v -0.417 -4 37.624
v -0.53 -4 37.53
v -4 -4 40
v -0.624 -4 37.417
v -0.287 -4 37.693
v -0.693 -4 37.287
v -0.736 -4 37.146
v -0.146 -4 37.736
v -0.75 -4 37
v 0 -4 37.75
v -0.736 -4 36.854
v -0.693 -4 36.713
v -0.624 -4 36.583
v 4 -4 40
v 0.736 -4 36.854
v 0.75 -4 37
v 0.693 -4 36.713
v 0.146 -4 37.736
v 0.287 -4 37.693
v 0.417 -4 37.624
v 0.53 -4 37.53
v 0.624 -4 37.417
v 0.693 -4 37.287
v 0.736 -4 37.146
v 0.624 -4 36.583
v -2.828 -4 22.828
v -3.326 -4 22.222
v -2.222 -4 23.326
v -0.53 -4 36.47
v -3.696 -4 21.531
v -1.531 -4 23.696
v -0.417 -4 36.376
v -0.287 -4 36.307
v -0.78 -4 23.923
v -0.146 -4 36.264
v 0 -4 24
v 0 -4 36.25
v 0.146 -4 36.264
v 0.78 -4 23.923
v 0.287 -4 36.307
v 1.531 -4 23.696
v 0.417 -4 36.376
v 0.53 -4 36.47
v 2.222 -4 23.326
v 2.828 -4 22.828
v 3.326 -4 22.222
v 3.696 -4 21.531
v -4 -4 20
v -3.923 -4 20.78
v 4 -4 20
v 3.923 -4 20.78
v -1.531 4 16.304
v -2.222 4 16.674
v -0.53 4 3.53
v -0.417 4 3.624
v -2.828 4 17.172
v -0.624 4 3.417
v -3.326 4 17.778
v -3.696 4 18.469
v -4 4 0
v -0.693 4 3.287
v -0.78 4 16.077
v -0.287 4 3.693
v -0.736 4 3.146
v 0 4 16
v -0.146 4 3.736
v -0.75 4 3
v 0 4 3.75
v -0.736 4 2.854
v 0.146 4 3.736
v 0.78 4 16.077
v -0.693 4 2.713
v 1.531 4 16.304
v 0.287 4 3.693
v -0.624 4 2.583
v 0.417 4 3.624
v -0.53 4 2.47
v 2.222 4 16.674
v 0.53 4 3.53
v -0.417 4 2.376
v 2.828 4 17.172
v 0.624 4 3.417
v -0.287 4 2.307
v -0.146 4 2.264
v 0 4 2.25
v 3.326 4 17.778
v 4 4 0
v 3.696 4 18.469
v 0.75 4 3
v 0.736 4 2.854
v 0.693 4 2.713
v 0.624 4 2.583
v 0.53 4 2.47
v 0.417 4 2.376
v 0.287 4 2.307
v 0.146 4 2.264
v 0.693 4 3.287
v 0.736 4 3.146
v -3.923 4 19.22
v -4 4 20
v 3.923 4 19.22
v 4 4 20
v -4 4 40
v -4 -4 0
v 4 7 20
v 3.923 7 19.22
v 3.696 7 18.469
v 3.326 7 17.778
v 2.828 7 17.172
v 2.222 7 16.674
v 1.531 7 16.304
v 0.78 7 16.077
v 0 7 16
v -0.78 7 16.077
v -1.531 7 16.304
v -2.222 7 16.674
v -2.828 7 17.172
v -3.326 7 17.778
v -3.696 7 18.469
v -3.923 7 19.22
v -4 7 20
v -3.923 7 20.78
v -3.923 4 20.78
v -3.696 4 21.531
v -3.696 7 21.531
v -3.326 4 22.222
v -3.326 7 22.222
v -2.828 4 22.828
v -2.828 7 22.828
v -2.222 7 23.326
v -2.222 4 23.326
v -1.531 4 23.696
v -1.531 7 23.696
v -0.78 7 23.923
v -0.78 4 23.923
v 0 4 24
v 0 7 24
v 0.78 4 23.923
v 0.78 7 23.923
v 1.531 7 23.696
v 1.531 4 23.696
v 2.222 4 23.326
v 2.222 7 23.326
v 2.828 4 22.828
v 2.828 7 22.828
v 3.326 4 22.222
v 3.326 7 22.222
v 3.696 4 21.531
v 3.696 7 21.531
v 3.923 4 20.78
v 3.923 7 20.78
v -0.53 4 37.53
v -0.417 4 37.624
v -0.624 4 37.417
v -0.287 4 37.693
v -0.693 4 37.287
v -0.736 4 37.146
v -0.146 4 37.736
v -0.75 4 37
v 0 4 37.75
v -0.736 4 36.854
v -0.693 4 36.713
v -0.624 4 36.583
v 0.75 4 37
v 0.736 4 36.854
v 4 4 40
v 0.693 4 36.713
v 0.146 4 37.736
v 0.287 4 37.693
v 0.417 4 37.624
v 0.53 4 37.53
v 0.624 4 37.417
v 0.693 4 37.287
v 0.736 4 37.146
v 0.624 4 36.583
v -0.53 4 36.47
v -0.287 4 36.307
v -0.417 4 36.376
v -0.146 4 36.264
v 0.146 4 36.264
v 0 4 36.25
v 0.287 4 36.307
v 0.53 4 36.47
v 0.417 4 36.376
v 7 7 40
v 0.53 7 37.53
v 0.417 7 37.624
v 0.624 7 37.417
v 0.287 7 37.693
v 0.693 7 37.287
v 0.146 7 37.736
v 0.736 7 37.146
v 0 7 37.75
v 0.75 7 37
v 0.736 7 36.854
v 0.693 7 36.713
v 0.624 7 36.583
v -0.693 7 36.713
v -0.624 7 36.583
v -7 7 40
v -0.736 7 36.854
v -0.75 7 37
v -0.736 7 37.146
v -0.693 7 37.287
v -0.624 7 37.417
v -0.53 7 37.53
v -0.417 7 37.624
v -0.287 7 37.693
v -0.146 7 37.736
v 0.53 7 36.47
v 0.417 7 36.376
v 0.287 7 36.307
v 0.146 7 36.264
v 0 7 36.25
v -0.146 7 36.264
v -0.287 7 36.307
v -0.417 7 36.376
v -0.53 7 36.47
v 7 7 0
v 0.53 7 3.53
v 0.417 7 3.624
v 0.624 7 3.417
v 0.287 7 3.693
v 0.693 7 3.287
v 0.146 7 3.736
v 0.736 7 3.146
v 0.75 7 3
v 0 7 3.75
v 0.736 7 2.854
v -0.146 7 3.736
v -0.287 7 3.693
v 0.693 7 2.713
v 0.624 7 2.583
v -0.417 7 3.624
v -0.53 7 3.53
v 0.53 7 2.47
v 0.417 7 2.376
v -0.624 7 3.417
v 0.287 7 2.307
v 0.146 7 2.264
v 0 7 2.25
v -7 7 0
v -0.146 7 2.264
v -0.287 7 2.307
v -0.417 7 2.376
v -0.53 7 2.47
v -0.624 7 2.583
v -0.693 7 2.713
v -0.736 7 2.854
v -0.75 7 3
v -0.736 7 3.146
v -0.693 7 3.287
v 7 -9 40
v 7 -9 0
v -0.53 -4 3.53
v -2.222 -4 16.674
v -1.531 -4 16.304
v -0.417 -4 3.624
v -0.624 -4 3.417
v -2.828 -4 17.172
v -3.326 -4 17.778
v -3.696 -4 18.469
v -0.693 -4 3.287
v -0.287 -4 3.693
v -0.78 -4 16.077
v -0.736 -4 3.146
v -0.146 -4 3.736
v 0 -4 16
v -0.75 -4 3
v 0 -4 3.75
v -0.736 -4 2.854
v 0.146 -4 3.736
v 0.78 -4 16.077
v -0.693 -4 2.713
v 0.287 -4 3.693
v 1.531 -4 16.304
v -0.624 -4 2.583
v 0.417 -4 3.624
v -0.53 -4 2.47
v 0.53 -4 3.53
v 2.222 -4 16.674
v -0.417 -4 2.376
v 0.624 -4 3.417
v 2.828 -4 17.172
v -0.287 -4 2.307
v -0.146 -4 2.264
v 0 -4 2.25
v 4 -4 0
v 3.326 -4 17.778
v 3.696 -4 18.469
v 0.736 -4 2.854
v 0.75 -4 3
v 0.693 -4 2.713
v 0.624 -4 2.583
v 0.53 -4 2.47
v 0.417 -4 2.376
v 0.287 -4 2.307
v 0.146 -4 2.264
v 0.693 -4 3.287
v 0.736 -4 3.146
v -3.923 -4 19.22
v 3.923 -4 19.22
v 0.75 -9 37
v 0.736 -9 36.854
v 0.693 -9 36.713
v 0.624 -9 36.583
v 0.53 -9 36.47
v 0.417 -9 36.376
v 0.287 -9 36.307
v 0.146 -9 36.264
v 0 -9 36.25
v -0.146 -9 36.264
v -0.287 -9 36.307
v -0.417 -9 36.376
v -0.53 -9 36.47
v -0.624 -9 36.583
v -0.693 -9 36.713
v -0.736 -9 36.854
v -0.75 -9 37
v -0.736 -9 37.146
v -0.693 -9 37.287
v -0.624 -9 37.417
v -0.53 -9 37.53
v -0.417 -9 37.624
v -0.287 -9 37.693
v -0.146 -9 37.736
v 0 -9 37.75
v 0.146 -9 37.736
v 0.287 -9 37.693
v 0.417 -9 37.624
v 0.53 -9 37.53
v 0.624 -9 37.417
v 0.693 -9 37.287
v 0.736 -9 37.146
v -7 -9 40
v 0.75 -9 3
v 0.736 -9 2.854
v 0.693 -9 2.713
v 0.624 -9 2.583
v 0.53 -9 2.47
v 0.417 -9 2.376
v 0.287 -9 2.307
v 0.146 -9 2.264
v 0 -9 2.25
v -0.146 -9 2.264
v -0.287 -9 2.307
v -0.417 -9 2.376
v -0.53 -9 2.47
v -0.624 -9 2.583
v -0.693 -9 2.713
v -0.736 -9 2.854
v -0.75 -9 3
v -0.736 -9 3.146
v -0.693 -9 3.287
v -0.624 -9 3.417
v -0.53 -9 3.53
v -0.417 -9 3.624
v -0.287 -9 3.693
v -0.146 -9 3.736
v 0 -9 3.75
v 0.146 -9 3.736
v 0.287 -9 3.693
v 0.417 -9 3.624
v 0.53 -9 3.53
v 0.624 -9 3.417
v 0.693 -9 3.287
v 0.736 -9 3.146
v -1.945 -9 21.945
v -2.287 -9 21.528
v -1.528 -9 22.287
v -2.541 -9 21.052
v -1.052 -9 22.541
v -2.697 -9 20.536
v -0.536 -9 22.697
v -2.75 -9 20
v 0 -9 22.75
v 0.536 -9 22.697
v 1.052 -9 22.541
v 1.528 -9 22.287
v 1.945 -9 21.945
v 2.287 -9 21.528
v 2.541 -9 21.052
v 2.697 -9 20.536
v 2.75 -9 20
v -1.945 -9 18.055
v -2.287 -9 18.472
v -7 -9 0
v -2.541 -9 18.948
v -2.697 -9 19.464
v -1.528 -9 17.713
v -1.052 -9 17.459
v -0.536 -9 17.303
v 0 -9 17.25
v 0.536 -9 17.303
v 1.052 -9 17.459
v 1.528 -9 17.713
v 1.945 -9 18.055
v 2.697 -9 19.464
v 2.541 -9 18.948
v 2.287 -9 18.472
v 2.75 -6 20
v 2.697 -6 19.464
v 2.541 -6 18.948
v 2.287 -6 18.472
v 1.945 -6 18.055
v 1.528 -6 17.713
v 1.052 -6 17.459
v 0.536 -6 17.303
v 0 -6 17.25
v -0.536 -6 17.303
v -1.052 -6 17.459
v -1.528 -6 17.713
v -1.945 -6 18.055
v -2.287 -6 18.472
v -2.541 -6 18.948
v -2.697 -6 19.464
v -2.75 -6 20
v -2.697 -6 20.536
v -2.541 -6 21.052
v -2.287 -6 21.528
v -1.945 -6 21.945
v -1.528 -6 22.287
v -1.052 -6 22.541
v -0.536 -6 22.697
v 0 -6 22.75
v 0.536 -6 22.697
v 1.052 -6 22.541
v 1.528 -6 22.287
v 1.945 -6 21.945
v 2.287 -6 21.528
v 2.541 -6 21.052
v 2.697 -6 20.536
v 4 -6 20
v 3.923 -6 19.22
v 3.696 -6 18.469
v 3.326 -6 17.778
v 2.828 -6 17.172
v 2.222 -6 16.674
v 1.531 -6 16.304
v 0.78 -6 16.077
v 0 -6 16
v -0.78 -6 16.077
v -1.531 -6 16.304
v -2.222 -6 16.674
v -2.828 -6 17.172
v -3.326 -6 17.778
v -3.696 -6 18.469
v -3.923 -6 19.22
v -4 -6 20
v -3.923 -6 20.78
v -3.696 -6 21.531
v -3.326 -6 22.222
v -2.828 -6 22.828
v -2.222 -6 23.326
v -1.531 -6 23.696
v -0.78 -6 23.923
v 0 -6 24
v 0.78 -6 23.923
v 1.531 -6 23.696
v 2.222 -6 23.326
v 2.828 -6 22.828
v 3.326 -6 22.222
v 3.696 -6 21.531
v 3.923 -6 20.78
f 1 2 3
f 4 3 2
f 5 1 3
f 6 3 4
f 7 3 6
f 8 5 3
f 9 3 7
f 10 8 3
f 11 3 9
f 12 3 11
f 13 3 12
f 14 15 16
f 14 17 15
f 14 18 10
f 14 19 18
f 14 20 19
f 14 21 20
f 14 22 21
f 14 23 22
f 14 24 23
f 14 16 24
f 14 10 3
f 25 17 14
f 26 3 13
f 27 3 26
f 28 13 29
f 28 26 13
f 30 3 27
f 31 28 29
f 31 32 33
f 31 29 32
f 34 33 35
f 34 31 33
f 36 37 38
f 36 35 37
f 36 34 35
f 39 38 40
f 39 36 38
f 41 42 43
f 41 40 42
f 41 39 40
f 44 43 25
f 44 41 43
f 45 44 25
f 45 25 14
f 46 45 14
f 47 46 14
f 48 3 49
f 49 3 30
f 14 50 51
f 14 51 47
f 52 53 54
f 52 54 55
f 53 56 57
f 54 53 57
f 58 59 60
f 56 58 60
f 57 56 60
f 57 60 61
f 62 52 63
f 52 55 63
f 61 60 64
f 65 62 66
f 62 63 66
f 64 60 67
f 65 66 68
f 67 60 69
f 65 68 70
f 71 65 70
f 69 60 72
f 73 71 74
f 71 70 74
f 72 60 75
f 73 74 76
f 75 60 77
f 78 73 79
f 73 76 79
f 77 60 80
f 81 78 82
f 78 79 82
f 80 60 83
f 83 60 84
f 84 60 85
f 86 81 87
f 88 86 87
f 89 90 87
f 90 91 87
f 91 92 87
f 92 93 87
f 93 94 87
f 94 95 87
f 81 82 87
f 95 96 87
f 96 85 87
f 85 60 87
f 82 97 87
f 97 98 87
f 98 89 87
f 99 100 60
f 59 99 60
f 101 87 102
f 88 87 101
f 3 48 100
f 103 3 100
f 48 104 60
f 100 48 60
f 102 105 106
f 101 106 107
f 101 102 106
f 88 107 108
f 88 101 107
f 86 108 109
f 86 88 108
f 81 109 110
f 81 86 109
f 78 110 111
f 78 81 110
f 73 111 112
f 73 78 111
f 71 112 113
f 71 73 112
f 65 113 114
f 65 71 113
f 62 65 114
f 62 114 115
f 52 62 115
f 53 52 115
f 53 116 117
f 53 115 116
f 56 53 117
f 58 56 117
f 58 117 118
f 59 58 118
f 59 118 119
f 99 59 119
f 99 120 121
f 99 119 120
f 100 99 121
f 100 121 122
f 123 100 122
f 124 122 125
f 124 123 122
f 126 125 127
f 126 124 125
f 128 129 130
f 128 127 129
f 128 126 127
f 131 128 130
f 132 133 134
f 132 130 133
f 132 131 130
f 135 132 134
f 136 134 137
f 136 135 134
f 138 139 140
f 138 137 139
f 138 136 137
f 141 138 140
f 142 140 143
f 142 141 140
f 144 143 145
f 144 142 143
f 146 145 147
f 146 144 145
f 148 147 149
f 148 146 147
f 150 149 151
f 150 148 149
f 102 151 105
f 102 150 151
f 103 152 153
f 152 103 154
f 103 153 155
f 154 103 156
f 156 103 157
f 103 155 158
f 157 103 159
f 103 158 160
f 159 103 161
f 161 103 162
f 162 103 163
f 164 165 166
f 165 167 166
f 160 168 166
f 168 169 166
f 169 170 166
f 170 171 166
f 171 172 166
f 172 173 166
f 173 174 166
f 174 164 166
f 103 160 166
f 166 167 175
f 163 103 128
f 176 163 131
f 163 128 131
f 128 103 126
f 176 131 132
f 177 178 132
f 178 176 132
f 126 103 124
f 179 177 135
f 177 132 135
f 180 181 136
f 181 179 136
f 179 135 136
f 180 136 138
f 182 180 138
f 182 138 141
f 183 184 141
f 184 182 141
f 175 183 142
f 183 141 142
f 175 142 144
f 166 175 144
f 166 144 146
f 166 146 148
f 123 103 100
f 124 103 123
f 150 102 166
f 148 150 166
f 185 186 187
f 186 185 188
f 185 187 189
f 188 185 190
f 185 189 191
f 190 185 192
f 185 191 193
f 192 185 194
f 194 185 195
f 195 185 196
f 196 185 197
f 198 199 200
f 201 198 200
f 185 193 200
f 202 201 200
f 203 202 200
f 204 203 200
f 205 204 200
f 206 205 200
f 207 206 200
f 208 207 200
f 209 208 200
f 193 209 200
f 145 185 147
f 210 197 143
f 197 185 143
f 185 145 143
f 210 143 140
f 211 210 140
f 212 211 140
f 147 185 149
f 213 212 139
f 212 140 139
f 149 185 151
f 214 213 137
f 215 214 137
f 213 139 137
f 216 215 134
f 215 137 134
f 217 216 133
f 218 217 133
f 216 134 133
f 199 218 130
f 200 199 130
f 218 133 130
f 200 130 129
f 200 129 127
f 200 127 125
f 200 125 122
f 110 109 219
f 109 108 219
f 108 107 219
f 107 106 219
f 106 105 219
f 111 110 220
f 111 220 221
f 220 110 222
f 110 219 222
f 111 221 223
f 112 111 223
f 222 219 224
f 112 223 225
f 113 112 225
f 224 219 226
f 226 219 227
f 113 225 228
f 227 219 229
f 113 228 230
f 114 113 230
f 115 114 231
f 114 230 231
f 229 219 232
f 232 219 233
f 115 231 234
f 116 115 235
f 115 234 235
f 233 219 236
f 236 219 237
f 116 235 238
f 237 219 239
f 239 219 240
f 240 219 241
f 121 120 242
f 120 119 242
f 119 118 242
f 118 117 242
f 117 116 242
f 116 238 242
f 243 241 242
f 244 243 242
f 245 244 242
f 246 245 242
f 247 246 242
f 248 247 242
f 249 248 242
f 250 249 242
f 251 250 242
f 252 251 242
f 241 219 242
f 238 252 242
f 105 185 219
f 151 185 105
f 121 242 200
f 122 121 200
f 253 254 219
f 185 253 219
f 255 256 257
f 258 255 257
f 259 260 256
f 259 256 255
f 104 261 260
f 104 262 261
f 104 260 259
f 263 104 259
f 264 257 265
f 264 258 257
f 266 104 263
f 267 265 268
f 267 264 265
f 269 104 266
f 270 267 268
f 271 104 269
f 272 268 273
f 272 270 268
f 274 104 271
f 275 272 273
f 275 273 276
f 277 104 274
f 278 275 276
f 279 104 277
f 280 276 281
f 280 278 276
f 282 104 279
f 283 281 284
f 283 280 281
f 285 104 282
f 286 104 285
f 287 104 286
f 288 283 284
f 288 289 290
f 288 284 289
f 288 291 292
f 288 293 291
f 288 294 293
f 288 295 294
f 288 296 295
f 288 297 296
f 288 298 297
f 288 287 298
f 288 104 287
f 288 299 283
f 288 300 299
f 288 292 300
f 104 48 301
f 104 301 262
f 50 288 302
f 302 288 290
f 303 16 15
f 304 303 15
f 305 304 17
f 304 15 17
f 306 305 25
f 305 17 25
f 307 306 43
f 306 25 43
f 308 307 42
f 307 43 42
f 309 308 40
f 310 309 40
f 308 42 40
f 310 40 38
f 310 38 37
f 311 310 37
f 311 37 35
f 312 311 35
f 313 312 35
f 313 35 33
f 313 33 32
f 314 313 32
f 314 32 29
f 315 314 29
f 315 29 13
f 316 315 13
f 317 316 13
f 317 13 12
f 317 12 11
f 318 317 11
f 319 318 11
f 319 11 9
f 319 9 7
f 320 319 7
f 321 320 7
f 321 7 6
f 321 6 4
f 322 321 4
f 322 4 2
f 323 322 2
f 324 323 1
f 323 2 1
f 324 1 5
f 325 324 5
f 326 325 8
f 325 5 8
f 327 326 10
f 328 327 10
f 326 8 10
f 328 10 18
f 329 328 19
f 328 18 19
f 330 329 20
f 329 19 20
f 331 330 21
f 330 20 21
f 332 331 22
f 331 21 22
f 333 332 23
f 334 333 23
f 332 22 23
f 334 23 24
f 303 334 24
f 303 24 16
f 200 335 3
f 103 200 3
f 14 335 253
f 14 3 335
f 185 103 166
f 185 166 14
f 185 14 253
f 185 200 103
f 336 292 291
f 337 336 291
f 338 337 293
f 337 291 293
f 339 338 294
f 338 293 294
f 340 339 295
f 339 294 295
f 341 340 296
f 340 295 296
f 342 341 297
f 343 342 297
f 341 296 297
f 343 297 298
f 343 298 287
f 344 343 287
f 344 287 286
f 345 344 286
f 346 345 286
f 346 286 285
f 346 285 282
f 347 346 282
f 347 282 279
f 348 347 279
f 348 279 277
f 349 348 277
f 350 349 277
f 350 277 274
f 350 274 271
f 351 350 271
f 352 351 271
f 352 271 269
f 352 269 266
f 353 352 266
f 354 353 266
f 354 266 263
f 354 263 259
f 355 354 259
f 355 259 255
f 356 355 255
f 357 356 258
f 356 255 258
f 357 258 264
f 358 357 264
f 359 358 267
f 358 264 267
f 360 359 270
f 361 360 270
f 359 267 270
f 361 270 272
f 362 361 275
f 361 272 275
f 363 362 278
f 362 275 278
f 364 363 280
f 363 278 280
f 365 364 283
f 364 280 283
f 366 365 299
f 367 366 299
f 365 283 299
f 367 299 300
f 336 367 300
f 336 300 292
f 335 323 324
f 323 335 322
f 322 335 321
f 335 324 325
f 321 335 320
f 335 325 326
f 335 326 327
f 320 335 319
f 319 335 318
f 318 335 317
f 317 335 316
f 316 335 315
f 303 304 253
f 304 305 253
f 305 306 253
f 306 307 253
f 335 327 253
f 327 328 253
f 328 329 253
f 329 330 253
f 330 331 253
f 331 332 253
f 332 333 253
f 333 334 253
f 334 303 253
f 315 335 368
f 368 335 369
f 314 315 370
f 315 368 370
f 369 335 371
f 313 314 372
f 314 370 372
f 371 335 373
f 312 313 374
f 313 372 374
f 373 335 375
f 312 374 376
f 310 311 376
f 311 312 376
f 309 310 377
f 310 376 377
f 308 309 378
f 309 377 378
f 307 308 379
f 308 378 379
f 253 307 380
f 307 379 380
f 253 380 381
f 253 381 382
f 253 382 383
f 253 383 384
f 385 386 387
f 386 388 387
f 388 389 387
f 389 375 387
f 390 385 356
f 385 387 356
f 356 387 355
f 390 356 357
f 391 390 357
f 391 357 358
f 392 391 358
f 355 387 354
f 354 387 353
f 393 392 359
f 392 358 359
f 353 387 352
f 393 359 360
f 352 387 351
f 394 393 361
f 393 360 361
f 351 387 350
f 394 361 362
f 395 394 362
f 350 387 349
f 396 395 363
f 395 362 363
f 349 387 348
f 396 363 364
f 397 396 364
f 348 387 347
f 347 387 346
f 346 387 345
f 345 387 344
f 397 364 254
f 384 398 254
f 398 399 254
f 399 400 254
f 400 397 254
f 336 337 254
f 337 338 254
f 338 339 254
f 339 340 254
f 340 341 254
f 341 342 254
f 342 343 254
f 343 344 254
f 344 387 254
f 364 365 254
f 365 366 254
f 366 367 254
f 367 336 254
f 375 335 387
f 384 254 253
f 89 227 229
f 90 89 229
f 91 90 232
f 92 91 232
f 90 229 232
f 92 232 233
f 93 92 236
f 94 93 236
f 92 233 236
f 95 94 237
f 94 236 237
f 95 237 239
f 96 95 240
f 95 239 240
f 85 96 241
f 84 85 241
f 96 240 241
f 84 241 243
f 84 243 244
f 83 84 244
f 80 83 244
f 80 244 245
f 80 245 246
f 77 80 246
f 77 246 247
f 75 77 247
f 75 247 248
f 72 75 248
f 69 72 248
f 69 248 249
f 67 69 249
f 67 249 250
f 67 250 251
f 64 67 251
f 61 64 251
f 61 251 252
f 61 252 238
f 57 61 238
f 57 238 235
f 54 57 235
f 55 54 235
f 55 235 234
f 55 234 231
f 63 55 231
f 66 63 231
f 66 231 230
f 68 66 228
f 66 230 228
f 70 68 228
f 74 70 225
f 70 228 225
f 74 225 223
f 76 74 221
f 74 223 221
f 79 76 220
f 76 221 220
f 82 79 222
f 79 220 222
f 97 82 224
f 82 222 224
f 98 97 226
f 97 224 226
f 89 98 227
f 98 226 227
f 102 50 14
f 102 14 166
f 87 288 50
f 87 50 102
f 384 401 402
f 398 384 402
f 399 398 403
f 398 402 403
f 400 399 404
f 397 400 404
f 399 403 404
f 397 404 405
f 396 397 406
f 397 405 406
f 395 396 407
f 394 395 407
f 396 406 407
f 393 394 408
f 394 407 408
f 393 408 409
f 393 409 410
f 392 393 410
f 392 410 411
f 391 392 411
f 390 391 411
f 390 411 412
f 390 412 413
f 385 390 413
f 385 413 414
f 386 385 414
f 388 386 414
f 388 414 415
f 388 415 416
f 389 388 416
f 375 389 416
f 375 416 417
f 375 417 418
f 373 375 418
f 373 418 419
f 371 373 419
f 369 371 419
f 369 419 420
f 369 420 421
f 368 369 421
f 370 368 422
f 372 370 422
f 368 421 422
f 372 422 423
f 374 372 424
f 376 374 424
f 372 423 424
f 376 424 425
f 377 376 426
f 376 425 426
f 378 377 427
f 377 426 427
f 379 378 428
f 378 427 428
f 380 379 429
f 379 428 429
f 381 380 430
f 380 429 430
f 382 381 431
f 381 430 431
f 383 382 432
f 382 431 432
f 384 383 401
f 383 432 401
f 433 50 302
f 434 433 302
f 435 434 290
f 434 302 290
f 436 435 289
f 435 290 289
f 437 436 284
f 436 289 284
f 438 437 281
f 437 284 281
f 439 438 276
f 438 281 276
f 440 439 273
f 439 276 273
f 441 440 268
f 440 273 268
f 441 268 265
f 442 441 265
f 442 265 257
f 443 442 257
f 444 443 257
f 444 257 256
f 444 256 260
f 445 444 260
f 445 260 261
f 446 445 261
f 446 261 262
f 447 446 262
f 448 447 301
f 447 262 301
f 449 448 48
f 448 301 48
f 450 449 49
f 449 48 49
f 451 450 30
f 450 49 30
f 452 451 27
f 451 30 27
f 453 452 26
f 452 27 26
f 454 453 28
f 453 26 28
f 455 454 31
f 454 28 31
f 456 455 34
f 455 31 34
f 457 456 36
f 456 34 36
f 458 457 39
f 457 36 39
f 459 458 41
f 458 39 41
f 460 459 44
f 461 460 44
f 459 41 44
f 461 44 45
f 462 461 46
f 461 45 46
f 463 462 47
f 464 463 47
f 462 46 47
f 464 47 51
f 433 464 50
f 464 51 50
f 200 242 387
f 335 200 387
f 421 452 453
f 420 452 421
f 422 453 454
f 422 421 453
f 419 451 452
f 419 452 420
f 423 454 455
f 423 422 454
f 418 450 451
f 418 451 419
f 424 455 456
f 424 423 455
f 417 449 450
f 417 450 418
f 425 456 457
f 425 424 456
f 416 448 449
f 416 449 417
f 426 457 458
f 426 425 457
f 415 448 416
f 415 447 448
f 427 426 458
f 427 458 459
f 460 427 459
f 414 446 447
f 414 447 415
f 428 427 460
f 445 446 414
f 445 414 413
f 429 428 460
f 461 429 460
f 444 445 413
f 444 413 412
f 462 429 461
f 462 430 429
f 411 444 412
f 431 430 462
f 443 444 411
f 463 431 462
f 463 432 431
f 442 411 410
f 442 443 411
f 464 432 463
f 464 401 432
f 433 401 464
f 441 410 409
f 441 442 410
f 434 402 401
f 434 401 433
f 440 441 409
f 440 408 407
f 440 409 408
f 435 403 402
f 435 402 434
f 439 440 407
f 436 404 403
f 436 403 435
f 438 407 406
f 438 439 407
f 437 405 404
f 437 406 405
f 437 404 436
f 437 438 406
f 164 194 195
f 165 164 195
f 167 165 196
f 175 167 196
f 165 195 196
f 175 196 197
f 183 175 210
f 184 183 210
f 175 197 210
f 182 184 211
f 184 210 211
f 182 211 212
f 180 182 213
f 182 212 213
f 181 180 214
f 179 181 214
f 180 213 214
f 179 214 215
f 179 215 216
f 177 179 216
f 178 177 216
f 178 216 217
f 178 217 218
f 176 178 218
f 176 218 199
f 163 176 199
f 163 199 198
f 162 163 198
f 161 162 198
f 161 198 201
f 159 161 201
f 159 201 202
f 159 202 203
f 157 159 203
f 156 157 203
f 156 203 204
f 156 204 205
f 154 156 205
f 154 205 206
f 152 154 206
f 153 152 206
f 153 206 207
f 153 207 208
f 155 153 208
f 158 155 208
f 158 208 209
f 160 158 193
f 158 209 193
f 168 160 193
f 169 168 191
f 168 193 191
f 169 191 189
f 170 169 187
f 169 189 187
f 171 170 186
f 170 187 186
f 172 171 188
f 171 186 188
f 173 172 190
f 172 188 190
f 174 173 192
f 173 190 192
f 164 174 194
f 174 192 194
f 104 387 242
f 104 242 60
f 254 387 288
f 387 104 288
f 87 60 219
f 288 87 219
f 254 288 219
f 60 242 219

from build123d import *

# Parameters (mm, degrees)
SKETCH1_W               = 8
SKETCH1_H               = 8
BOSS_EXTRUDE1_DEPTH     = 40
SKETCH2_R               = 2.75
CUT_EXTRUDE1_DEPTH      = 18
SKETCH4_R               = 0.75
CUT_EXTRUDE2_DEPTH      = 19
CUT_EXTRUDE3_DEPTH      = 30
CUT_EXTRUDE3_DEPTH_BACK = 2
SKETCH2_5_R             = 4


with BuildPart() as part:
    # Sketch1 → Boss-Extrude1 (new body)
    with BuildSketch(Plane.XY):
        Polygon((-7, 7), (-7, -7), (-7, -9), (7, -9), (7, -7), (7, 7), align=None)
        Rectangle(SKETCH1_W, SKETCH1_H, mode=Mode.SUBTRACT)
    extrude(amount=BOSS_EXTRUDE1_DEPTH)

    # Sketch2 → Cut-Extrude1 (cut)
    with BuildSketch(Plane(origin=(0, -4, 0), x_dir=(1, 0, 0), z_dir=(0, 1, 0))):
        with Locations((0, -20)):
            Circle(SKETCH2_R)
    extrude(amount=-CUT_EXTRUDE1_DEPTH, mode=Mode.SUBTRACT)

    # Sketch4 → Cut-Extrude2 (cut)
    with BuildSketch(Plane(origin=(0, 7, 0), x_dir=(1, 0, 0), z_dir=(0, 1, 0))):
        with Locations((0, -3)):
            Circle(SKETCH4_R)
        with Locations((0, -37)):
            Circle(SKETCH4_R)
    extrude(amount=-CUT_EXTRUDE2_DEPTH, mode=Mode.SUBTRACT)

    # Sketch2<5> → Cut-Extrude3 (cut, two sides: drawn at the far end of the back side and taken through both)
    with BuildSketch(Plane(origin=(0, -4, 0), x_dir=(1, 0, 0), z_dir=(0, 1, 0)).offset(-CUT_EXTRUDE3_DEPTH_BACK)):
        with Locations((0, -20)):
            Circle(SKETCH2_5_R)
    extrude(amount=CUT_EXTRUDE3_DEPTH + CUT_EXTRUDE3_DEPTH_BACK, mode=Mode.SUBTRACT)


solid = part.part
